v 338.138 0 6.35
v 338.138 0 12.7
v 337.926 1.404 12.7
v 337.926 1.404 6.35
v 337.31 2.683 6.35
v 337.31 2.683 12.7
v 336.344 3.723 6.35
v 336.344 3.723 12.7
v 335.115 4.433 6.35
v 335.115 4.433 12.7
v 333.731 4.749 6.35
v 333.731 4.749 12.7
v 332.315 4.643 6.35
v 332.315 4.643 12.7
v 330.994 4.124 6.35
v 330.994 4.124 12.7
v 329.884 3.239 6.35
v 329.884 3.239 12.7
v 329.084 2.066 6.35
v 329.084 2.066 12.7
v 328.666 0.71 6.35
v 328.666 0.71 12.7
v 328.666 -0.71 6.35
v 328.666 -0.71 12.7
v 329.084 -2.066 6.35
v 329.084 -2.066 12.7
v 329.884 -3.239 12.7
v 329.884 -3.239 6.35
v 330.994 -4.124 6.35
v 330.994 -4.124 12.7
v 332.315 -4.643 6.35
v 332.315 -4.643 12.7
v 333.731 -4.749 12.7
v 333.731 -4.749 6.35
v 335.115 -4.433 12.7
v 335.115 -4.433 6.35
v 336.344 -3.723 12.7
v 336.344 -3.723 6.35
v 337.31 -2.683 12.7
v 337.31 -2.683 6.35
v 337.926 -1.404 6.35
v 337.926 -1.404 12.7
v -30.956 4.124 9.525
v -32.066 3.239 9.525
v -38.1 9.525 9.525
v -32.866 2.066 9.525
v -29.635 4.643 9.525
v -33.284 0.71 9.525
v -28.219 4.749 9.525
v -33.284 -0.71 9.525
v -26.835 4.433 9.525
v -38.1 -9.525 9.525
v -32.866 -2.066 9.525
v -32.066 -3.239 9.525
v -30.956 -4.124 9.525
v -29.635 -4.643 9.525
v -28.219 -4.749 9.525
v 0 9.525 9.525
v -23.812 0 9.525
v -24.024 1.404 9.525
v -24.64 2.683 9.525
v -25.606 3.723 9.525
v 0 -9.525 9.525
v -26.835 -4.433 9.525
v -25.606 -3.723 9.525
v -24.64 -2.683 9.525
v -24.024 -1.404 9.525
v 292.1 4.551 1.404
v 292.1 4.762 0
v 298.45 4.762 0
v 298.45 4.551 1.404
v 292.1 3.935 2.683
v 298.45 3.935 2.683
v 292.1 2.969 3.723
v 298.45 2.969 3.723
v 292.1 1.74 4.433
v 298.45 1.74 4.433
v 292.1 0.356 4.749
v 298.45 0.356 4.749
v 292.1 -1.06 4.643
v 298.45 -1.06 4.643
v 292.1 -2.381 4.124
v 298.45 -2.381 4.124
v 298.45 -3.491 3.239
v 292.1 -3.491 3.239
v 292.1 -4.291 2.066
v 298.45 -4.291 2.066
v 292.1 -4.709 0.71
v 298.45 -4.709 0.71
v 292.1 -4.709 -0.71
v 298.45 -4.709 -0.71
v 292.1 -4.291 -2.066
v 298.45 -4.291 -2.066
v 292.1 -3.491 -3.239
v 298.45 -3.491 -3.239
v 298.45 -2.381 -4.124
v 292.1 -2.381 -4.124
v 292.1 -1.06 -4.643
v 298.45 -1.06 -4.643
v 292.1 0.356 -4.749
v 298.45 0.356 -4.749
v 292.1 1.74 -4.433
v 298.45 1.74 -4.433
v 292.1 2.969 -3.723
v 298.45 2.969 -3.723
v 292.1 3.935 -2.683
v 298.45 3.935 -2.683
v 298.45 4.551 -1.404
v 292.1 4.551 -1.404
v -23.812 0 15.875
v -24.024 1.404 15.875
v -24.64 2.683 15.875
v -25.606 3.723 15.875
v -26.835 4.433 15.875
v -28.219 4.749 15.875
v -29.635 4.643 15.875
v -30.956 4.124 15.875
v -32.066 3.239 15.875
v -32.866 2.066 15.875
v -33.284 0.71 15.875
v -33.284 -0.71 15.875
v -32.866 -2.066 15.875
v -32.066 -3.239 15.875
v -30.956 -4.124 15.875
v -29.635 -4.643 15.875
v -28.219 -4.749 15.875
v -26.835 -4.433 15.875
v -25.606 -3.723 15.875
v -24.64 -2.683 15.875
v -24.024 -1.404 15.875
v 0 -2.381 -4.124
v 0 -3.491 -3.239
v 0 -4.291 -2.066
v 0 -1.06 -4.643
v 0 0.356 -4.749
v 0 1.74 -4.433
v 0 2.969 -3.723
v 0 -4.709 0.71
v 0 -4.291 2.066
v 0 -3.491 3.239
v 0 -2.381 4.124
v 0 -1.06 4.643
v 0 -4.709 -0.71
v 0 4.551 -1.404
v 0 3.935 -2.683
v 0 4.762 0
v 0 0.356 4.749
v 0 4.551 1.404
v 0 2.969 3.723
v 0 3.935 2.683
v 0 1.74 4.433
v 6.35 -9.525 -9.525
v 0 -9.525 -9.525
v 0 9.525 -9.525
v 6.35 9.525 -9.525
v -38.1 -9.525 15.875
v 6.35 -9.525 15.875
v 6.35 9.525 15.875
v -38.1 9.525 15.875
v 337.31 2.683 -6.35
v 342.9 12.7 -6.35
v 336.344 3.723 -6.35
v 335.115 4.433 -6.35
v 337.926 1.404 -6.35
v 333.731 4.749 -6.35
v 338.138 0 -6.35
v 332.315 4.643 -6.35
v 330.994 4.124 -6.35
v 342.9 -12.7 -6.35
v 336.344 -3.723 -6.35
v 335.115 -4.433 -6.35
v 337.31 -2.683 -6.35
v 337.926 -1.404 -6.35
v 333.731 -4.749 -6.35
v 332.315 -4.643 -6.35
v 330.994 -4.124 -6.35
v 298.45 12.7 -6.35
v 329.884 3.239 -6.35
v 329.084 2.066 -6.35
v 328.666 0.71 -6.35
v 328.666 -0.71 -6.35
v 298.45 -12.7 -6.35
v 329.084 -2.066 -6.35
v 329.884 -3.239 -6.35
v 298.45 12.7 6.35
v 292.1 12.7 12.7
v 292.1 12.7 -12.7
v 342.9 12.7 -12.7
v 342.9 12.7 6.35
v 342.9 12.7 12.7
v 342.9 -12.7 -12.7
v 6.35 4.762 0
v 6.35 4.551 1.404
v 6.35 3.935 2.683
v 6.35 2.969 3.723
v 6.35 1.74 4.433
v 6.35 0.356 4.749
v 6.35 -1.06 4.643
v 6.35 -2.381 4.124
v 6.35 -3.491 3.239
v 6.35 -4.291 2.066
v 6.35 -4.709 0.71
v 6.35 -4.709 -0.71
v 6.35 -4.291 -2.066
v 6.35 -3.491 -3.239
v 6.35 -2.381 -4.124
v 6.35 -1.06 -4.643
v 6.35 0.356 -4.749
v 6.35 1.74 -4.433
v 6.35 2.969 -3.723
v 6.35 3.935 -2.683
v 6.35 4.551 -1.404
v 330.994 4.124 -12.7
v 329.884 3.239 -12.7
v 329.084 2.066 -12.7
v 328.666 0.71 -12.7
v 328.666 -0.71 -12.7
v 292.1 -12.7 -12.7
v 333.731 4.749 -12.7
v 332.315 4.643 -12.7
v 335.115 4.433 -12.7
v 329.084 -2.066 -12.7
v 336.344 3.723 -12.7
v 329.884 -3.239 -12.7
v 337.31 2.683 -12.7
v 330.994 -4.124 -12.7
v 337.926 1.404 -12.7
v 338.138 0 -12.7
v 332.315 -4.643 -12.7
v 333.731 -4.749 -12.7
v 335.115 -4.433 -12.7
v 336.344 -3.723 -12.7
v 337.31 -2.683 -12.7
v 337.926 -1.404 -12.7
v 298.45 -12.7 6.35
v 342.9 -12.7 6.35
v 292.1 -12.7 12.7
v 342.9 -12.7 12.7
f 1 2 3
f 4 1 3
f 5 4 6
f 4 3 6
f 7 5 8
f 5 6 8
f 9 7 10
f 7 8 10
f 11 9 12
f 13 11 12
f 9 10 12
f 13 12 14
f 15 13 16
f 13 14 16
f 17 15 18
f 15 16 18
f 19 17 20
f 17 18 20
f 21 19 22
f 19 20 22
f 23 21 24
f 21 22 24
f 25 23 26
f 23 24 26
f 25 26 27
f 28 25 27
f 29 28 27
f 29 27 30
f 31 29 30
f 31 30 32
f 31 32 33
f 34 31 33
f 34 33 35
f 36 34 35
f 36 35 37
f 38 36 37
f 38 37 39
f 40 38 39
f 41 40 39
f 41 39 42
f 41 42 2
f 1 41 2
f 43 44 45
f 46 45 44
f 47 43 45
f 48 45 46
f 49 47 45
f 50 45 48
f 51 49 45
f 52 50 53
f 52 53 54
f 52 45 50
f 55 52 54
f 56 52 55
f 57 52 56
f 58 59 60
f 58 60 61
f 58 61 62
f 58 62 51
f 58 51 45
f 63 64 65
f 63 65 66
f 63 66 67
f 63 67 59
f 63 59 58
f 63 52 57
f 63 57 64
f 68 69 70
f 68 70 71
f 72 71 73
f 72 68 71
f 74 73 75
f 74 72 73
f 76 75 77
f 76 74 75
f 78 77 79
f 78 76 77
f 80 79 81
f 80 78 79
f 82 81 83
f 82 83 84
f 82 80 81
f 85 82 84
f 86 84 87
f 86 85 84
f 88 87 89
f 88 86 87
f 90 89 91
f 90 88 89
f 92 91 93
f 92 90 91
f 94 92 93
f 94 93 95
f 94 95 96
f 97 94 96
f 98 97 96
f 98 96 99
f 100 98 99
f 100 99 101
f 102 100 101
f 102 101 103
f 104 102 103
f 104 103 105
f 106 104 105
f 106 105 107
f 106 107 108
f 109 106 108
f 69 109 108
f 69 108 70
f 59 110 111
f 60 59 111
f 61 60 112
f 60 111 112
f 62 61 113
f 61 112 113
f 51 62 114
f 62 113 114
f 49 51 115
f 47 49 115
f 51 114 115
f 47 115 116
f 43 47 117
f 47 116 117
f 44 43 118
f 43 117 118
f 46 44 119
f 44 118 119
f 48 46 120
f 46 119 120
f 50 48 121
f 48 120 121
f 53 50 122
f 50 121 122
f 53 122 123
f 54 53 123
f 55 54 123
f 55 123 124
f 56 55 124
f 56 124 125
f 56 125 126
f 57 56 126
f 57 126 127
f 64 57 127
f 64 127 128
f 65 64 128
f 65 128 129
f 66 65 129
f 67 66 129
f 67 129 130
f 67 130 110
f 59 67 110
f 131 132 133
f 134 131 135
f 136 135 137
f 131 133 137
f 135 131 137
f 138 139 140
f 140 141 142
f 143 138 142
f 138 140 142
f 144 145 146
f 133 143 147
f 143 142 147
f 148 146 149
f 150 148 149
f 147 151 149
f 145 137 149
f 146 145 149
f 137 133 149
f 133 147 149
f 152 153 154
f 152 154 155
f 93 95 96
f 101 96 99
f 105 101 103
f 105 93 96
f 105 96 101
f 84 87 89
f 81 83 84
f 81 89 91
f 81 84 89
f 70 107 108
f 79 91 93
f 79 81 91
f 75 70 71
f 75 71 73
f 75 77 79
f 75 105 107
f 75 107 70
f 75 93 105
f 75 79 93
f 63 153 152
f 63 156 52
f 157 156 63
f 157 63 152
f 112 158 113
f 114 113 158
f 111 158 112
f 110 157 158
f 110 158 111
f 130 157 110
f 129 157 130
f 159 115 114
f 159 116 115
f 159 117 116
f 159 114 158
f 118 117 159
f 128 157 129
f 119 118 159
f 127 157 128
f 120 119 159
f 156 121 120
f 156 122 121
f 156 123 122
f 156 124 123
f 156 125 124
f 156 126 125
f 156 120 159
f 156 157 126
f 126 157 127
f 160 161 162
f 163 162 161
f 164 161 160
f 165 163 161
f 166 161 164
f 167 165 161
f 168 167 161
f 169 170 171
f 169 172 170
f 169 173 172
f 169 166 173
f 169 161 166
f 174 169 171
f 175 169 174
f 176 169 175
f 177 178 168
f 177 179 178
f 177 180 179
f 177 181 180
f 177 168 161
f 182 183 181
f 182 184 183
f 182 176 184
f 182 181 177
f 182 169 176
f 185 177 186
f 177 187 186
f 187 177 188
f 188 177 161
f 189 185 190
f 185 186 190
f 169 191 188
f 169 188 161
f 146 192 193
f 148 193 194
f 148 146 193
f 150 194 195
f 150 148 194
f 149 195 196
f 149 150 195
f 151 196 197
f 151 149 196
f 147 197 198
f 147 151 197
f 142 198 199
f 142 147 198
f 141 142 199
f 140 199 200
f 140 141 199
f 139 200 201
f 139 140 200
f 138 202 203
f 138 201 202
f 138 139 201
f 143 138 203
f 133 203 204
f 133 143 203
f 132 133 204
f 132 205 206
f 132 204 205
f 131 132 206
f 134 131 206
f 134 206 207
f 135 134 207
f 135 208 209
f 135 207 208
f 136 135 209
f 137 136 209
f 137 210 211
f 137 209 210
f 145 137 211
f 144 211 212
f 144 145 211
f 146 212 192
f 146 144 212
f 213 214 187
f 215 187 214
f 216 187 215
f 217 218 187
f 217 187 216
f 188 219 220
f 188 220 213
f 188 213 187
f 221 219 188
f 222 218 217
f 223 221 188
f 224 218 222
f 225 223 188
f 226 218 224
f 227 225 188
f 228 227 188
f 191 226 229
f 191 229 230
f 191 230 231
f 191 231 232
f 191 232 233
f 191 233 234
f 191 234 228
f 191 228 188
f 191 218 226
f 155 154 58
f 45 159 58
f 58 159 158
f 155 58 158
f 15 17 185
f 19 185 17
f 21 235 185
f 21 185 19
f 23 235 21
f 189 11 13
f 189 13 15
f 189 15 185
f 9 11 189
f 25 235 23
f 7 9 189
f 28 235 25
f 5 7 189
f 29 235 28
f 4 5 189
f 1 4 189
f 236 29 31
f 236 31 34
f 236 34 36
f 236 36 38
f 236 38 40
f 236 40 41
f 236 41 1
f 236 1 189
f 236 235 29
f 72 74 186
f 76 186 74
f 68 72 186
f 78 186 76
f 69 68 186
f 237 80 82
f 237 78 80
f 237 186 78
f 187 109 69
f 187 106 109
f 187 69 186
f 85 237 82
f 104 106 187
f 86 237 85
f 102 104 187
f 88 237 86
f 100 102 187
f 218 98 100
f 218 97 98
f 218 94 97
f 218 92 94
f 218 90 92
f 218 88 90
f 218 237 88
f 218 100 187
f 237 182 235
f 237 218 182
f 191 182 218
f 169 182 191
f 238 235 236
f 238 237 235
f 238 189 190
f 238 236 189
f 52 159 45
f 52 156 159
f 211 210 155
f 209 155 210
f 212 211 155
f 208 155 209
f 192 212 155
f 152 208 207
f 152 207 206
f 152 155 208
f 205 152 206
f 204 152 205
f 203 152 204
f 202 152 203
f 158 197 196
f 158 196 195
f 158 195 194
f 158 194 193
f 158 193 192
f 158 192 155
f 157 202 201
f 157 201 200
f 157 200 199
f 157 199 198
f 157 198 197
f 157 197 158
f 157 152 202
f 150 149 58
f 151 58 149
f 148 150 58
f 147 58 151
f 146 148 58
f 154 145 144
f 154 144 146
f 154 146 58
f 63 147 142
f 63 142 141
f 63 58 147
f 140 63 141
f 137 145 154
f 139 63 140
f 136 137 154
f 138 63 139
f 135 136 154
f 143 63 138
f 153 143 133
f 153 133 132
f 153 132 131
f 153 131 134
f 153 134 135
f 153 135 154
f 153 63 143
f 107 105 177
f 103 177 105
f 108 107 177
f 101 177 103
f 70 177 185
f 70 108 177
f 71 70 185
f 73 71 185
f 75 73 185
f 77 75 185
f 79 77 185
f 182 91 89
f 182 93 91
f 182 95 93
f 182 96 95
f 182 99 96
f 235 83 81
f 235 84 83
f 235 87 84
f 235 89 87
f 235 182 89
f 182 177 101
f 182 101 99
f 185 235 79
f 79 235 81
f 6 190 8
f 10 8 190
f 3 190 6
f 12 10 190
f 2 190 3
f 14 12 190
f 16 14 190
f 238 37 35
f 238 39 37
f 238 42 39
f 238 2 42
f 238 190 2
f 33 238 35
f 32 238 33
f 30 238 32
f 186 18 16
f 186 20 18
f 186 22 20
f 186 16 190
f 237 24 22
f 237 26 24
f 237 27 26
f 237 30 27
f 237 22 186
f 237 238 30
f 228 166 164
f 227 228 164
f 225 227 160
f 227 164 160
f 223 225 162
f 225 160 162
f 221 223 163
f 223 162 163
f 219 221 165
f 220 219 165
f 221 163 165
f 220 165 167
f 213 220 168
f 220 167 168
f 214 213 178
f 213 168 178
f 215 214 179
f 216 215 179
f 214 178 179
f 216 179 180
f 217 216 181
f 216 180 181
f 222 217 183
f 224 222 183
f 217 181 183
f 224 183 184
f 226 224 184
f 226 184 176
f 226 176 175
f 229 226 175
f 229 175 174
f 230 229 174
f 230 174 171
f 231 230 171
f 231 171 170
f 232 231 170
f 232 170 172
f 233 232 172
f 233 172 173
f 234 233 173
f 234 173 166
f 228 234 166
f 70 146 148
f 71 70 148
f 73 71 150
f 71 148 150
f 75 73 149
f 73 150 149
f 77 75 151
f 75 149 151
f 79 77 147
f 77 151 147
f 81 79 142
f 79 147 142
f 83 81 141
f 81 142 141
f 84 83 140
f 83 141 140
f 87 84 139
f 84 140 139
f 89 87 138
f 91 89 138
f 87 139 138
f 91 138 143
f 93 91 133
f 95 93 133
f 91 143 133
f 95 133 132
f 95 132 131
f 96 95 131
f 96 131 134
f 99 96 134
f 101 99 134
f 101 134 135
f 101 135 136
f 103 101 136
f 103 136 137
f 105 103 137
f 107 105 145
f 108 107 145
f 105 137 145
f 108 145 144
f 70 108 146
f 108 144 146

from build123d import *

# Parameters (mm, degrees)
F0_R      = 4.7625
F1_DEPTH  = 298.45
F3_DEPTH  = 9.525
F5_R      = 4.7625
F6_DEPTH  = 25.401
F8_DEPTH  = 12.7
F10_R     = 4.7625
F11_DEPTH = 25.401


# Not quite as in the source:
# - a length typed as a fraction of an inch, garbled in the dataset ("3 / 203.2 mm" for 3/8 in), is restored


with BuildPart() as f1:
    # F0 (on Right) → F1 (new body)
    with BuildSketch(Plane.YZ):
        Circle(F0_R)
    extrude(amount=F1_DEPTH)


with BuildPart() as f3:
    # F2 (on Front) → F3 (new body, symmetric)
    with BuildSketch(Plane.XZ):
        Polygon((-38.1, 9.525), (0, 9.525), (0, -9.525), (6.35, -9.525), (6.35, 15.875), (-38.1, 15.875), align=None)
    extrude(amount=F3_DEPTH, both=True)

    # F4: cut F1
    add(f1.part, mode=Mode.SUBTRACT)

    # F5 (on face) → F6 (cut, through all)
    with BuildSketch(Plane.XY.offset(15.875)):
        with Locations((-28.575, 0)):
            Circle(F5_R)
    extrude(amount=-F6_DEPTH, mode=Mode.SUBTRACT)


with BuildPart() as f8:
    # F7 (on Front) → F8 (new body, symmetric)
    with BuildSketch(Plane.XZ):
        Polygon((342.9, 12.7), (292.1, 12.7), (292.1, -12.7), (342.9, -12.7), (342.9, -6.35), (298.45, -6.35), (298.45, 6.35), (342.9, 6.35), align=None)
    extrude(amount=F8_DEPTH, both=True)

    # F9: cut F1
    add(f1.part, mode=Mode.SUBTRACT)

    # F10 (on face) → F11 (cut, through all)
    with BuildSketch(Plane.XY.offset(12.7)):
        with Locations((333.375, 0)):
            Circle(F10_R)
    extrude(amount=-F11_DEPTH, mode=Mode.SUBTRACT)


solid = Compound([f1.part, f3.part, f8.part])
